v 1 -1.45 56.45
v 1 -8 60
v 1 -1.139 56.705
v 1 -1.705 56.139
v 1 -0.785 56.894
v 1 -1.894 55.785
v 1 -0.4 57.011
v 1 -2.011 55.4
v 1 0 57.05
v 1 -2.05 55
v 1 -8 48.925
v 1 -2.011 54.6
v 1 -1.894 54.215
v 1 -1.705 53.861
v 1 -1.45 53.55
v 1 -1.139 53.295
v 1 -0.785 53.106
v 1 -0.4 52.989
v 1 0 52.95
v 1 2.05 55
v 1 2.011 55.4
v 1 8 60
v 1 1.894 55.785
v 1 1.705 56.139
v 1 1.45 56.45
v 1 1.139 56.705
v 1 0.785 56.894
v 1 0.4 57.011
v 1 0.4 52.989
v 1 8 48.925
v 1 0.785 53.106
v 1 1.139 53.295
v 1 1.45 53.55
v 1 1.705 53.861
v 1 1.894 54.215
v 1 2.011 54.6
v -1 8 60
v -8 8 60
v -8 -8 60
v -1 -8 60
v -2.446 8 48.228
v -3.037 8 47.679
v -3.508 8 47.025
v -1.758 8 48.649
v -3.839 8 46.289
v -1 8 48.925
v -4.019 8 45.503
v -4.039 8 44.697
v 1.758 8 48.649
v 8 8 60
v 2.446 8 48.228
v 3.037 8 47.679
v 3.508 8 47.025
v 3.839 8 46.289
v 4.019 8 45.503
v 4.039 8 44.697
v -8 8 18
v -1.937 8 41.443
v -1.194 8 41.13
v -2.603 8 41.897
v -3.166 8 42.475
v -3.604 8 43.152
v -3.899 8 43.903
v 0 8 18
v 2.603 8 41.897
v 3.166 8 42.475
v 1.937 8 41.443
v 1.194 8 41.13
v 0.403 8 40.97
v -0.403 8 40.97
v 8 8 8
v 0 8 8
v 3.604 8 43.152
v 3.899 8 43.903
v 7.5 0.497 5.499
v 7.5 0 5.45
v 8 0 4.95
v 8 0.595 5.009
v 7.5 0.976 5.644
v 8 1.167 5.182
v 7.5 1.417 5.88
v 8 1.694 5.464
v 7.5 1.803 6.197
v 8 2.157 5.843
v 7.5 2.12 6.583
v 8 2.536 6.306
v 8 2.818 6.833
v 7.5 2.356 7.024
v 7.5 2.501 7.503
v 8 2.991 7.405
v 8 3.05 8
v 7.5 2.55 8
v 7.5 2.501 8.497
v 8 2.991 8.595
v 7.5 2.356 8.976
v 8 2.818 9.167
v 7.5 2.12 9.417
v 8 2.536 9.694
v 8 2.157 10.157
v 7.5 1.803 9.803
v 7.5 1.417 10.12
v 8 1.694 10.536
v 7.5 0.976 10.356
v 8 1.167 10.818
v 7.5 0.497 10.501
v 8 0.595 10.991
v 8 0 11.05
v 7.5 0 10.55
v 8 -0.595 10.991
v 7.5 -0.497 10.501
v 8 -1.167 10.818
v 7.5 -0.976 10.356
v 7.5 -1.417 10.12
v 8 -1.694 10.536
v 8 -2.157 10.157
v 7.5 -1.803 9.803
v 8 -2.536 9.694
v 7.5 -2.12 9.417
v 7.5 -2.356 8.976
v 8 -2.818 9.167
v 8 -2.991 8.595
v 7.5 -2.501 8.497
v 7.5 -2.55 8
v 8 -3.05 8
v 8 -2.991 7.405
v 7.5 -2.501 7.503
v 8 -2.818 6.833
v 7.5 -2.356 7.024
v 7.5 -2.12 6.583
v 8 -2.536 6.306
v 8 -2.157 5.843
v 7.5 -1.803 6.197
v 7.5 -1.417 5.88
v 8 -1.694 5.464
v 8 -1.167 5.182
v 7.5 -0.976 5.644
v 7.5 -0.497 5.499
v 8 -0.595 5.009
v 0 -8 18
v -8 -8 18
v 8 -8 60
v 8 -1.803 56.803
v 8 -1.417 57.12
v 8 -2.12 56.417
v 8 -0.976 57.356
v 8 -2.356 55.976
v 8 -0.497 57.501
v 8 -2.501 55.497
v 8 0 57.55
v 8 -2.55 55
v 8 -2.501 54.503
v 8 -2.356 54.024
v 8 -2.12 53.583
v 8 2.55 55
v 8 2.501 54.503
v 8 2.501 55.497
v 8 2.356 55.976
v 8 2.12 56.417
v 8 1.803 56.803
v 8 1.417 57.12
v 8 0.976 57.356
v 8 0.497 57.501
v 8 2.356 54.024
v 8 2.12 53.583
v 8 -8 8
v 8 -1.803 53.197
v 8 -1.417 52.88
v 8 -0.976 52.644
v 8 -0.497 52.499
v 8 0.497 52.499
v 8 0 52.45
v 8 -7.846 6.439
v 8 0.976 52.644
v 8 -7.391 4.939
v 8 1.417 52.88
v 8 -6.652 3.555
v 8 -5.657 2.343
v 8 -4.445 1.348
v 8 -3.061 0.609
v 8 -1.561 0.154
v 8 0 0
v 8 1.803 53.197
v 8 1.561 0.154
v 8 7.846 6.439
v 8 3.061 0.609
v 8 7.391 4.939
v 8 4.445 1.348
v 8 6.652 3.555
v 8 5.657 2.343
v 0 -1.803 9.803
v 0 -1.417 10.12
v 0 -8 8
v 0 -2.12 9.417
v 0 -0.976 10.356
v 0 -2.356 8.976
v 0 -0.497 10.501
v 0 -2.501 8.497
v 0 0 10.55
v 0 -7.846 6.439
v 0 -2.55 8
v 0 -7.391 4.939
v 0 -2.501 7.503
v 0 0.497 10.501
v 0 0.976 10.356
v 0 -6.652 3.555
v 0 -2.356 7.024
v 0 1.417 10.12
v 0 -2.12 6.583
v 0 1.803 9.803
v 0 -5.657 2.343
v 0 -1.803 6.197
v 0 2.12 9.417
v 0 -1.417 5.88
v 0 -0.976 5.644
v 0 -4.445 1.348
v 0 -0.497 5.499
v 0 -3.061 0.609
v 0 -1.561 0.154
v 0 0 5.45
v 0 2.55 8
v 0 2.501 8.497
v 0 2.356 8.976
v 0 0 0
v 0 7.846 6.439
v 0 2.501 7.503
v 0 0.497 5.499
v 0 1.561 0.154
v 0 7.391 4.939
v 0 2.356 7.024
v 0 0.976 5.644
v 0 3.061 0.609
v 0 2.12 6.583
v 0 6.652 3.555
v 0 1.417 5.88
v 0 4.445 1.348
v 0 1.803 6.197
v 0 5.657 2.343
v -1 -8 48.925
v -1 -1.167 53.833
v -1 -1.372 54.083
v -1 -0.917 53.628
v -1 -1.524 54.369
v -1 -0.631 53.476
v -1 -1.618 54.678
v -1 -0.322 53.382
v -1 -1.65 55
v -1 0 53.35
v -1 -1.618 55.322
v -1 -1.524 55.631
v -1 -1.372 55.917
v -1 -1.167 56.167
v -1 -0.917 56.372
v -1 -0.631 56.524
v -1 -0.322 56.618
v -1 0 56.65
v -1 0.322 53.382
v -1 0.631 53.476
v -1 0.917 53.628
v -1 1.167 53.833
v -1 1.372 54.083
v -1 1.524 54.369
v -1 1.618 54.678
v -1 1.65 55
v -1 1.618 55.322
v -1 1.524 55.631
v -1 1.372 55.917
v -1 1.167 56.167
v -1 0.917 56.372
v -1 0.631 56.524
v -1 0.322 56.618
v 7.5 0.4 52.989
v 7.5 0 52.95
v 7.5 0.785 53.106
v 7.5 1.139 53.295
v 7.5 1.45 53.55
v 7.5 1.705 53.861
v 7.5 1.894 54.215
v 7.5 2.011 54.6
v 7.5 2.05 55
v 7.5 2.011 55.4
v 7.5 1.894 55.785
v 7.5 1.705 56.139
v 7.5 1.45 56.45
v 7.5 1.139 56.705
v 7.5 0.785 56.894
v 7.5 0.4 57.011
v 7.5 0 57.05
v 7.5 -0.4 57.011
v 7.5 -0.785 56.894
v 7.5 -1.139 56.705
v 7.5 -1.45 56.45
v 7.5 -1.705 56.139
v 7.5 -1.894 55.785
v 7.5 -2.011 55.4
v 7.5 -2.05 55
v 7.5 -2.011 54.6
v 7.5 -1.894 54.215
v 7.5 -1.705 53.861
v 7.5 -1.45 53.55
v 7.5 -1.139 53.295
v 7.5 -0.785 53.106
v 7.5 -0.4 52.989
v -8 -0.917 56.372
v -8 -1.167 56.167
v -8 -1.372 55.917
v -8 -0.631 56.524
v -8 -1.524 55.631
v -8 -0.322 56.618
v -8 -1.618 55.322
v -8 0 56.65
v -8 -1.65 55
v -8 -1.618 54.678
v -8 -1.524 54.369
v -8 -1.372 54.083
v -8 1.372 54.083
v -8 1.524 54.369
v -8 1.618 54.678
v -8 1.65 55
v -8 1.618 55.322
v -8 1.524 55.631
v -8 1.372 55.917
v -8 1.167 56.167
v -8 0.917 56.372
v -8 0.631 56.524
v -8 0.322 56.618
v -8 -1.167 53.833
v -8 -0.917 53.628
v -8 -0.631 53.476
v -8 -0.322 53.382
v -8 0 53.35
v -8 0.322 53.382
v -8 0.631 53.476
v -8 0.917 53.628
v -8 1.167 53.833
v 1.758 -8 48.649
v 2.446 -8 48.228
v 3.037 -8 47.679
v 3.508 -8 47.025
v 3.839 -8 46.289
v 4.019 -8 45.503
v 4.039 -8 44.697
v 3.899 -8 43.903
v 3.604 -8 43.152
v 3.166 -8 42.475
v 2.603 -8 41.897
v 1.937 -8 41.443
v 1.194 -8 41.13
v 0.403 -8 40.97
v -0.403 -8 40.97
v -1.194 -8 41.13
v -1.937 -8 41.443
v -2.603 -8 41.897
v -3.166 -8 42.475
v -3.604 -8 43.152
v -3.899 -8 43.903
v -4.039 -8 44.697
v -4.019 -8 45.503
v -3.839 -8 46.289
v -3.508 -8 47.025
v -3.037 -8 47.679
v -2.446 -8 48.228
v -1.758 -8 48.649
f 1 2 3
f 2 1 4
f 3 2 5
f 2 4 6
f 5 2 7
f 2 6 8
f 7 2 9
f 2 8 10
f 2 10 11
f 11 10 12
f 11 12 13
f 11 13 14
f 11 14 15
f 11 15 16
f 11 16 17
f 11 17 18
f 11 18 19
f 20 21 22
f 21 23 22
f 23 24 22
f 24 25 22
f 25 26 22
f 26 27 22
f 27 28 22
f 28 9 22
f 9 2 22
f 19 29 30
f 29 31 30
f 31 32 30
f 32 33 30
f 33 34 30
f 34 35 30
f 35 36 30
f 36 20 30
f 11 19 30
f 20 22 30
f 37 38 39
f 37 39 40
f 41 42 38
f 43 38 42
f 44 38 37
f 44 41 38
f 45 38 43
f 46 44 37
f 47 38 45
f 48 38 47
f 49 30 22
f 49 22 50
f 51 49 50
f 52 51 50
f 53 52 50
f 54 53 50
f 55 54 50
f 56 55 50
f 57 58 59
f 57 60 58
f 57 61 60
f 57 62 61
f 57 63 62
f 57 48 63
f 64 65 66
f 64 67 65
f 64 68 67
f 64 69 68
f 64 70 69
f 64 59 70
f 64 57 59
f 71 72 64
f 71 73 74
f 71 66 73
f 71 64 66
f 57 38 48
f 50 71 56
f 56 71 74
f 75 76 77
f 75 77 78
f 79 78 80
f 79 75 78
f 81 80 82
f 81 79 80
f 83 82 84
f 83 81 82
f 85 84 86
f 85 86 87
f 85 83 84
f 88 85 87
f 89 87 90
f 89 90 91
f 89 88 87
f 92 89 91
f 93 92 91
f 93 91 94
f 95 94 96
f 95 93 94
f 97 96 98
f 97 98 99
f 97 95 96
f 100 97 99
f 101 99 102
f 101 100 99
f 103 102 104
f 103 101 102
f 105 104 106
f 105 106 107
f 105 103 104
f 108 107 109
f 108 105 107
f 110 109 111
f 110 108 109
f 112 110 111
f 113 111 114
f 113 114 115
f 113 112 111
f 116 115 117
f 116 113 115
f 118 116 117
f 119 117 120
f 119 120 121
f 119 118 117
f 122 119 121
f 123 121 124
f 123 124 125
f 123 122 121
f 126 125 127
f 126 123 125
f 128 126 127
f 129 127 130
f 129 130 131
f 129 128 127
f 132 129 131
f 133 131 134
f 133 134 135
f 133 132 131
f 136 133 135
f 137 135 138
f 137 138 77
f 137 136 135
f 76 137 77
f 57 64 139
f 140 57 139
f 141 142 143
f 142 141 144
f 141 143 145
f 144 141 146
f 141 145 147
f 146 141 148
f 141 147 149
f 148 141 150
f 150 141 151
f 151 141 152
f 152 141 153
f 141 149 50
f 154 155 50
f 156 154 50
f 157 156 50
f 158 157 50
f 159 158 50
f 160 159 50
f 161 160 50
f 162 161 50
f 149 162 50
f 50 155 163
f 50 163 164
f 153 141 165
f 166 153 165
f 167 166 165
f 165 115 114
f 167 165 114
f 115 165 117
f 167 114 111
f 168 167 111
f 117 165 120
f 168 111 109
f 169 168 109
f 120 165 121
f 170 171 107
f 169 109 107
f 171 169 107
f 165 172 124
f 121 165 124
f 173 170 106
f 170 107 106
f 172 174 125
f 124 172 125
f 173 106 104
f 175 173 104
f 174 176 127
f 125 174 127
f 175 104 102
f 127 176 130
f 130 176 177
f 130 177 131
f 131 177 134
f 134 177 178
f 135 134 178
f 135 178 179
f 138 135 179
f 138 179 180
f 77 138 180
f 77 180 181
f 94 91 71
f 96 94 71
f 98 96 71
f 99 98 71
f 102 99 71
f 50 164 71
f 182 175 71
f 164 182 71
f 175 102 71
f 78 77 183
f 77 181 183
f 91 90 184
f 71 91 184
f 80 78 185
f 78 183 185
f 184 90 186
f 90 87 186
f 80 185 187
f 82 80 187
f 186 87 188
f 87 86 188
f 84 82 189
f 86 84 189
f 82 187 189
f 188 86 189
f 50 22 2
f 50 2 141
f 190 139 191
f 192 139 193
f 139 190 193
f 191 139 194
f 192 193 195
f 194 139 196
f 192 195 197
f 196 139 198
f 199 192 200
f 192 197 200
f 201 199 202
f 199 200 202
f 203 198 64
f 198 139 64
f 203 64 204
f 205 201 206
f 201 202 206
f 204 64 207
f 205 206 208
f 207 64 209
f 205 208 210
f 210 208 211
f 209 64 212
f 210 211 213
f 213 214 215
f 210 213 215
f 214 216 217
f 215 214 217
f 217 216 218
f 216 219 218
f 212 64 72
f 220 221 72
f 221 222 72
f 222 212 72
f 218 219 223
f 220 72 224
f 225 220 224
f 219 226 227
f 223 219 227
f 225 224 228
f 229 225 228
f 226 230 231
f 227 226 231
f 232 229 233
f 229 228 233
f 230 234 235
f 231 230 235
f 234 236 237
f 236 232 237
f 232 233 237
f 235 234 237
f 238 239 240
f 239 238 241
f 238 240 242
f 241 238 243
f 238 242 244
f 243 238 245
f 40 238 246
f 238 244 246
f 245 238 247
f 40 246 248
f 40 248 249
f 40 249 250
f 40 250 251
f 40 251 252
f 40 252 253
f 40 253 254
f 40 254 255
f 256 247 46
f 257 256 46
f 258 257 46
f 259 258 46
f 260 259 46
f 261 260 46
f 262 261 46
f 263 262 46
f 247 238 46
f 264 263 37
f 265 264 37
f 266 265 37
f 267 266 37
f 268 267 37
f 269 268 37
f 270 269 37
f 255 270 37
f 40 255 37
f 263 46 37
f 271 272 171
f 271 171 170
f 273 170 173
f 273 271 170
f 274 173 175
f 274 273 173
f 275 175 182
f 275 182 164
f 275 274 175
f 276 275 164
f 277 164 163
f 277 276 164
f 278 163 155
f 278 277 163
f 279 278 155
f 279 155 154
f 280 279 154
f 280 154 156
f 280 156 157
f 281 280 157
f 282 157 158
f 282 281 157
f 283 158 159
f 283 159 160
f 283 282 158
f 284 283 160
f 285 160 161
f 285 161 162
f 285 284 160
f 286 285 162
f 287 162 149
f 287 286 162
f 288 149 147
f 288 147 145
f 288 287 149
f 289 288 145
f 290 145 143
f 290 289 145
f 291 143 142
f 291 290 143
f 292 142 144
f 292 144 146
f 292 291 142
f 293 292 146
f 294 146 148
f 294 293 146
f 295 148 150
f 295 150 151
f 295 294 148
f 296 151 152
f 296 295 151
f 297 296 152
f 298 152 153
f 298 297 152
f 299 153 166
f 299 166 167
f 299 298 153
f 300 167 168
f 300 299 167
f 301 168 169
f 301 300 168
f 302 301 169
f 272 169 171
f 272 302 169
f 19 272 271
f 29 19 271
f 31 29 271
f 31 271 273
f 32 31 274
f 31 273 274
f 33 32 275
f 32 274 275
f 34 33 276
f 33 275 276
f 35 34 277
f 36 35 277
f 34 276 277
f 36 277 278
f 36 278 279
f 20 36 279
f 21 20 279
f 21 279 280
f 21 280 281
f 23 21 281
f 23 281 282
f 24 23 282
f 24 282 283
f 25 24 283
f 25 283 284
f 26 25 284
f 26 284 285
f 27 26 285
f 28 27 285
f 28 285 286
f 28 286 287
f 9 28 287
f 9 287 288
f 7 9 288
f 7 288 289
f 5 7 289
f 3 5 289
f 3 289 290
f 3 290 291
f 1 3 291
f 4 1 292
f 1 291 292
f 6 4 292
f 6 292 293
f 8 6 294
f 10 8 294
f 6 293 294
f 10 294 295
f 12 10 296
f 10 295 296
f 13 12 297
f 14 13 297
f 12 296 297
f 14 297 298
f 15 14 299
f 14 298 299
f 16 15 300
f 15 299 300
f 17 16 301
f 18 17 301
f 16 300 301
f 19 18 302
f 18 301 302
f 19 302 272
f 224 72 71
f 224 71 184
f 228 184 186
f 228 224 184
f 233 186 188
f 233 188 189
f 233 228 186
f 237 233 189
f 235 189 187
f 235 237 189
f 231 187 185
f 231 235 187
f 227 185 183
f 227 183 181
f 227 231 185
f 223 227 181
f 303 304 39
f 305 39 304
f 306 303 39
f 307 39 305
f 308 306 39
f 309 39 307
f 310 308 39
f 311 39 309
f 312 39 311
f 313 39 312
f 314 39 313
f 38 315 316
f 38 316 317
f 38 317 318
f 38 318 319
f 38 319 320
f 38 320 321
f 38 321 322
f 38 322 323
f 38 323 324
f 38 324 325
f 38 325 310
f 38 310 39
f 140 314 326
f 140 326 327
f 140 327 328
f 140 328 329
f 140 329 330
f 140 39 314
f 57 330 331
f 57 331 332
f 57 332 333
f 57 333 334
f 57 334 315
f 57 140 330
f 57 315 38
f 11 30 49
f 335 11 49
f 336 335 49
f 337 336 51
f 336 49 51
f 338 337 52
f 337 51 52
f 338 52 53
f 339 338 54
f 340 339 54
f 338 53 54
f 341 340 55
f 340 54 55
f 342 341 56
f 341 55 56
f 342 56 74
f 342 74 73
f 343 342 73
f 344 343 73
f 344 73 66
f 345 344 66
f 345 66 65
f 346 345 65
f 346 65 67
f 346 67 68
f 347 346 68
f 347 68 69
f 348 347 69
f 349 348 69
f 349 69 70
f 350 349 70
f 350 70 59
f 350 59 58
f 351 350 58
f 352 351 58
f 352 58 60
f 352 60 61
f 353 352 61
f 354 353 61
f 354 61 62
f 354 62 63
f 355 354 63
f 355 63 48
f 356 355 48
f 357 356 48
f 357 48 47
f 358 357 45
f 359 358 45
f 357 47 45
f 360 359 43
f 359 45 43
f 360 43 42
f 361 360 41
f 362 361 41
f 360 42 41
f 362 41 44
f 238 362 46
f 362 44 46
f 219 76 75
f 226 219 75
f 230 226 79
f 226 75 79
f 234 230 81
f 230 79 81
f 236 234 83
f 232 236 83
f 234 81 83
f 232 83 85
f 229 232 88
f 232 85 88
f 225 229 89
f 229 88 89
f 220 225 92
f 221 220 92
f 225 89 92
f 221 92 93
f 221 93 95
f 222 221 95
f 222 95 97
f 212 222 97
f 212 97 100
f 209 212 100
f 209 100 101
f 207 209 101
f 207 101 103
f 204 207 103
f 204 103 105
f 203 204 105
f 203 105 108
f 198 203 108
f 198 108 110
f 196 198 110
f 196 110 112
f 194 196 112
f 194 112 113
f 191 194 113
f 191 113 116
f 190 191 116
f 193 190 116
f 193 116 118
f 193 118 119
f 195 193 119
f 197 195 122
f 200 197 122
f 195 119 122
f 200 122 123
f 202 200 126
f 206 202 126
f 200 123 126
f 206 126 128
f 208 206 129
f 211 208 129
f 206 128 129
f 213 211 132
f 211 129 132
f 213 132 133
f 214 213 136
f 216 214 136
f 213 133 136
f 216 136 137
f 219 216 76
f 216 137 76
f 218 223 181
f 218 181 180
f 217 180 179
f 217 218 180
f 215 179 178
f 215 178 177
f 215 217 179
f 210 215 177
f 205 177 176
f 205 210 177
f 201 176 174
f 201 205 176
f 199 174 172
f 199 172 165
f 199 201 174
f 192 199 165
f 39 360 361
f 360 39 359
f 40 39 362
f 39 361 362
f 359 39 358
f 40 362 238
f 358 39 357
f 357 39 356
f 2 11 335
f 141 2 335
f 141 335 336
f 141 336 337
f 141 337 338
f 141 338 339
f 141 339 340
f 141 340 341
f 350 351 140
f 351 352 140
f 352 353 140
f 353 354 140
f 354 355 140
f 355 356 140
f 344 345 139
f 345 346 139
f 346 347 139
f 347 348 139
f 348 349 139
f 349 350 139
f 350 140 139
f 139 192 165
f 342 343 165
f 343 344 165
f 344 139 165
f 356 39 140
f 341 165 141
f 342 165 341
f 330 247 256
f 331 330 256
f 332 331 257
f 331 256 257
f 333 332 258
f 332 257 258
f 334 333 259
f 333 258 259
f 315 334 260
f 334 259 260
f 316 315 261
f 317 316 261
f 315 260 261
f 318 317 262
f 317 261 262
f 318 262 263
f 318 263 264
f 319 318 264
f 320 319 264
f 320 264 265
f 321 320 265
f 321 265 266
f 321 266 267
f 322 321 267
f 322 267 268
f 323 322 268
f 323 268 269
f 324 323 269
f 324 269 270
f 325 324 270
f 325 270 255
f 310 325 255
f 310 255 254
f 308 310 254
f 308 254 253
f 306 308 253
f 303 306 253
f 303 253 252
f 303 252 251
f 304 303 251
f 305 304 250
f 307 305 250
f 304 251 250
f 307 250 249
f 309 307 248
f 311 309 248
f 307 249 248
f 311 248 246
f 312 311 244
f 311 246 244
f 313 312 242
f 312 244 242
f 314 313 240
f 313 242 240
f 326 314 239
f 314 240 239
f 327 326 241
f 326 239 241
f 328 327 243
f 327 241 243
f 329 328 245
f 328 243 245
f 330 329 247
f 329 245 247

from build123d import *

# Parameters (mm, degrees)
SKETCH1_W                                   = 16
SKETCH1_H                                   = 16
BASE_DEPTH                                  = 60
INDICATORHOLE_DEPTH                         = 63.60990337
INDICATORMOUNT_REACH                        = 64.61
SKETCH3_R                                   = 2.05
CHAMFERINDICATORMOUNT_SIZE                  = 0.5
M4X0_7_TAPPED_HOLE_FOR_INDICATORSCREW_D     = 3.3
M4X0_7_TAPPED_HOLE_FOR_INDICATORSCREW_DEPTH = 7.908579979
M4X0_7_TAPPED_HOLE_FOR_INDICATORSCREW_TIP   = 0.991420021
SKETCH6_W                                   = 19.86895154
SKETCH6_H                                   = 16
SLOTFORANOTHERPART_DEPTH                    = 62.05735009
CHAMFERFORSLOT_DEPTH                        = 62.05735009
SKETCH7_R                                   = 2.55
SCREWHOLEFORSLOT_DEPTH                      = 63.60990337
CHAMFERFORSCREWSLOT_SIZE                    = 0.5


with BuildPart() as part:
    # Sketch1 → Base (new body)
    with BuildSketch(Plane.XY):
        Rectangle(SKETCH1_W, SKETCH1_H)
    extrude(amount=BASE_DEPTH)

    # Sketch2 → IndicatorHole (cut, through all)
    with BuildSketch(Plane(origin=(0, 8, 0), x_dir=(1, 0, 0), z_dir=(0, 1, 0))):
        with BuildLine():
            Line((-1, -48.924601891), (-1, -60))
            Line((-1, -60), (1, -60))
            Line((1, -60), (1, -48.924601891))
            ThreePointArc((1, -48.924601891), (0, -40.95), (-1, -48.924601891))
        make_face()
    extrude(amount=-INDICATORHOLE_DEPTH, mode=Mode.SUBTRACT)

    # Sketch3 → IndicatorMount (cut, up to next)
    with BuildSketch(Plane(origin=(8, 0, 0), x_dir=(0, 0, -1), z_dir=(1, 0, 0)), mode=Mode.PRIVATE) as indicatormount_sk1:
        with Locations((-55, 0)):
            Circle(SKETCH3_R)
    indicatormount_tool1 = extrude(indicatormount_sk1.sketch, amount=-INDICATORMOUNT_REACH, mode=Mode.PRIVATE) & part.part
    add(indicatormount_tool1.solids().sort_by_distance((8, 0, 55))[0], mode=Mode.SUBTRACT)

    # ChamferIndicatorMount
    chamferindicatormount_edges = [part.edges().sort_by_distance(p)[0] for p in [
        (8, 0, 57.05),
    ]]
    chamfer(chamferindicatormount_edges, length=CHAMFERINDICATORMOUNT_SIZE)

    # M4x0.7 Tapped Hole for IndicatorScrew
    with Locations(Plane.ZY.offset(8)):
        with Locations((55, 0)):
            Hole(M4X0_7_TAPPED_HOLE_FOR_INDICATORSCREW_D / 2, depth=M4X0_7_TAPPED_HOLE_FOR_INDICATORSCREW_DEPTH)
            with Locations((0, 0, -(M4X0_7_TAPPED_HOLE_FOR_INDICATORSCREW_DEPTH + M4X0_7_TAPPED_HOLE_FOR_INDICATORSCREW_TIP / 2))):  # 118° drill point
                Cone(0, M4X0_7_TAPPED_HOLE_FOR_INDICATORSCREW_D / 2, M4X0_7_TAPPED_HOLE_FOR_INDICATORSCREW_TIP, mode=Mode.SUBTRACT)

    # Sketch6 → SlotForAnotherPart (cut, through all)
    with BuildSketch(Plane(origin=(0, 0, 0), x_dir=(0, 0, -1), z_dir=(1, 0, 0))):
        with Locations((-8.06552423, 0)):
            Rectangle(SKETCH6_W, SKETCH6_H)
    extrude(amount=-SLOTFORANOTHERPART_DEPTH, mode=Mode.SUBTRACT)

    # Sketch6<3> → ChamferForSlot (cut, through all)
    with BuildSketch(Plane(origin=(0, 0, 0), x_dir=(0, 0, -1), z_dir=(1, 0, 0))):
        with BuildLine():
            Line((1.86895154, 8), (-8, 8))
            ThreePointArc((-8, 8), (-2.343145751, 5.656854249), (0, 0))
            ThreePointArc((0, 0), (-2.343145751, -5.656854249), (-8, -8))
            Line((-8, -8), (1.86895154, -8))
            Line((1.86895154, -8), (1.86895154, 8))
        make_face()
    extrude(amount=CHAMFERFORSLOT_DEPTH, mode=Mode.SUBTRACT)

    # Sketch7 → ScrewHoleForSlot (cut, through all)
    with BuildSketch(Plane(origin=(8, 0, 0), x_dir=(0, 0, -1), z_dir=(1, 0, 0))):
        with Locations((-8, 0)):
            Circle(SKETCH7_R)
    extrude(amount=-SCREWHOLEFORSLOT_DEPTH, mode=Mode.SUBTRACT)

    # ChamferForScrewSlot
    chamferforscrewslot_edges = [part.edges().sort_by_distance(p)[0] for p in [
        (8, 0, 10.55),
    ]]
    chamfer(chamferforscrewslot_edges, length=CHAMFERFORSCREWSLOT_SIZE)


solid = part.part
